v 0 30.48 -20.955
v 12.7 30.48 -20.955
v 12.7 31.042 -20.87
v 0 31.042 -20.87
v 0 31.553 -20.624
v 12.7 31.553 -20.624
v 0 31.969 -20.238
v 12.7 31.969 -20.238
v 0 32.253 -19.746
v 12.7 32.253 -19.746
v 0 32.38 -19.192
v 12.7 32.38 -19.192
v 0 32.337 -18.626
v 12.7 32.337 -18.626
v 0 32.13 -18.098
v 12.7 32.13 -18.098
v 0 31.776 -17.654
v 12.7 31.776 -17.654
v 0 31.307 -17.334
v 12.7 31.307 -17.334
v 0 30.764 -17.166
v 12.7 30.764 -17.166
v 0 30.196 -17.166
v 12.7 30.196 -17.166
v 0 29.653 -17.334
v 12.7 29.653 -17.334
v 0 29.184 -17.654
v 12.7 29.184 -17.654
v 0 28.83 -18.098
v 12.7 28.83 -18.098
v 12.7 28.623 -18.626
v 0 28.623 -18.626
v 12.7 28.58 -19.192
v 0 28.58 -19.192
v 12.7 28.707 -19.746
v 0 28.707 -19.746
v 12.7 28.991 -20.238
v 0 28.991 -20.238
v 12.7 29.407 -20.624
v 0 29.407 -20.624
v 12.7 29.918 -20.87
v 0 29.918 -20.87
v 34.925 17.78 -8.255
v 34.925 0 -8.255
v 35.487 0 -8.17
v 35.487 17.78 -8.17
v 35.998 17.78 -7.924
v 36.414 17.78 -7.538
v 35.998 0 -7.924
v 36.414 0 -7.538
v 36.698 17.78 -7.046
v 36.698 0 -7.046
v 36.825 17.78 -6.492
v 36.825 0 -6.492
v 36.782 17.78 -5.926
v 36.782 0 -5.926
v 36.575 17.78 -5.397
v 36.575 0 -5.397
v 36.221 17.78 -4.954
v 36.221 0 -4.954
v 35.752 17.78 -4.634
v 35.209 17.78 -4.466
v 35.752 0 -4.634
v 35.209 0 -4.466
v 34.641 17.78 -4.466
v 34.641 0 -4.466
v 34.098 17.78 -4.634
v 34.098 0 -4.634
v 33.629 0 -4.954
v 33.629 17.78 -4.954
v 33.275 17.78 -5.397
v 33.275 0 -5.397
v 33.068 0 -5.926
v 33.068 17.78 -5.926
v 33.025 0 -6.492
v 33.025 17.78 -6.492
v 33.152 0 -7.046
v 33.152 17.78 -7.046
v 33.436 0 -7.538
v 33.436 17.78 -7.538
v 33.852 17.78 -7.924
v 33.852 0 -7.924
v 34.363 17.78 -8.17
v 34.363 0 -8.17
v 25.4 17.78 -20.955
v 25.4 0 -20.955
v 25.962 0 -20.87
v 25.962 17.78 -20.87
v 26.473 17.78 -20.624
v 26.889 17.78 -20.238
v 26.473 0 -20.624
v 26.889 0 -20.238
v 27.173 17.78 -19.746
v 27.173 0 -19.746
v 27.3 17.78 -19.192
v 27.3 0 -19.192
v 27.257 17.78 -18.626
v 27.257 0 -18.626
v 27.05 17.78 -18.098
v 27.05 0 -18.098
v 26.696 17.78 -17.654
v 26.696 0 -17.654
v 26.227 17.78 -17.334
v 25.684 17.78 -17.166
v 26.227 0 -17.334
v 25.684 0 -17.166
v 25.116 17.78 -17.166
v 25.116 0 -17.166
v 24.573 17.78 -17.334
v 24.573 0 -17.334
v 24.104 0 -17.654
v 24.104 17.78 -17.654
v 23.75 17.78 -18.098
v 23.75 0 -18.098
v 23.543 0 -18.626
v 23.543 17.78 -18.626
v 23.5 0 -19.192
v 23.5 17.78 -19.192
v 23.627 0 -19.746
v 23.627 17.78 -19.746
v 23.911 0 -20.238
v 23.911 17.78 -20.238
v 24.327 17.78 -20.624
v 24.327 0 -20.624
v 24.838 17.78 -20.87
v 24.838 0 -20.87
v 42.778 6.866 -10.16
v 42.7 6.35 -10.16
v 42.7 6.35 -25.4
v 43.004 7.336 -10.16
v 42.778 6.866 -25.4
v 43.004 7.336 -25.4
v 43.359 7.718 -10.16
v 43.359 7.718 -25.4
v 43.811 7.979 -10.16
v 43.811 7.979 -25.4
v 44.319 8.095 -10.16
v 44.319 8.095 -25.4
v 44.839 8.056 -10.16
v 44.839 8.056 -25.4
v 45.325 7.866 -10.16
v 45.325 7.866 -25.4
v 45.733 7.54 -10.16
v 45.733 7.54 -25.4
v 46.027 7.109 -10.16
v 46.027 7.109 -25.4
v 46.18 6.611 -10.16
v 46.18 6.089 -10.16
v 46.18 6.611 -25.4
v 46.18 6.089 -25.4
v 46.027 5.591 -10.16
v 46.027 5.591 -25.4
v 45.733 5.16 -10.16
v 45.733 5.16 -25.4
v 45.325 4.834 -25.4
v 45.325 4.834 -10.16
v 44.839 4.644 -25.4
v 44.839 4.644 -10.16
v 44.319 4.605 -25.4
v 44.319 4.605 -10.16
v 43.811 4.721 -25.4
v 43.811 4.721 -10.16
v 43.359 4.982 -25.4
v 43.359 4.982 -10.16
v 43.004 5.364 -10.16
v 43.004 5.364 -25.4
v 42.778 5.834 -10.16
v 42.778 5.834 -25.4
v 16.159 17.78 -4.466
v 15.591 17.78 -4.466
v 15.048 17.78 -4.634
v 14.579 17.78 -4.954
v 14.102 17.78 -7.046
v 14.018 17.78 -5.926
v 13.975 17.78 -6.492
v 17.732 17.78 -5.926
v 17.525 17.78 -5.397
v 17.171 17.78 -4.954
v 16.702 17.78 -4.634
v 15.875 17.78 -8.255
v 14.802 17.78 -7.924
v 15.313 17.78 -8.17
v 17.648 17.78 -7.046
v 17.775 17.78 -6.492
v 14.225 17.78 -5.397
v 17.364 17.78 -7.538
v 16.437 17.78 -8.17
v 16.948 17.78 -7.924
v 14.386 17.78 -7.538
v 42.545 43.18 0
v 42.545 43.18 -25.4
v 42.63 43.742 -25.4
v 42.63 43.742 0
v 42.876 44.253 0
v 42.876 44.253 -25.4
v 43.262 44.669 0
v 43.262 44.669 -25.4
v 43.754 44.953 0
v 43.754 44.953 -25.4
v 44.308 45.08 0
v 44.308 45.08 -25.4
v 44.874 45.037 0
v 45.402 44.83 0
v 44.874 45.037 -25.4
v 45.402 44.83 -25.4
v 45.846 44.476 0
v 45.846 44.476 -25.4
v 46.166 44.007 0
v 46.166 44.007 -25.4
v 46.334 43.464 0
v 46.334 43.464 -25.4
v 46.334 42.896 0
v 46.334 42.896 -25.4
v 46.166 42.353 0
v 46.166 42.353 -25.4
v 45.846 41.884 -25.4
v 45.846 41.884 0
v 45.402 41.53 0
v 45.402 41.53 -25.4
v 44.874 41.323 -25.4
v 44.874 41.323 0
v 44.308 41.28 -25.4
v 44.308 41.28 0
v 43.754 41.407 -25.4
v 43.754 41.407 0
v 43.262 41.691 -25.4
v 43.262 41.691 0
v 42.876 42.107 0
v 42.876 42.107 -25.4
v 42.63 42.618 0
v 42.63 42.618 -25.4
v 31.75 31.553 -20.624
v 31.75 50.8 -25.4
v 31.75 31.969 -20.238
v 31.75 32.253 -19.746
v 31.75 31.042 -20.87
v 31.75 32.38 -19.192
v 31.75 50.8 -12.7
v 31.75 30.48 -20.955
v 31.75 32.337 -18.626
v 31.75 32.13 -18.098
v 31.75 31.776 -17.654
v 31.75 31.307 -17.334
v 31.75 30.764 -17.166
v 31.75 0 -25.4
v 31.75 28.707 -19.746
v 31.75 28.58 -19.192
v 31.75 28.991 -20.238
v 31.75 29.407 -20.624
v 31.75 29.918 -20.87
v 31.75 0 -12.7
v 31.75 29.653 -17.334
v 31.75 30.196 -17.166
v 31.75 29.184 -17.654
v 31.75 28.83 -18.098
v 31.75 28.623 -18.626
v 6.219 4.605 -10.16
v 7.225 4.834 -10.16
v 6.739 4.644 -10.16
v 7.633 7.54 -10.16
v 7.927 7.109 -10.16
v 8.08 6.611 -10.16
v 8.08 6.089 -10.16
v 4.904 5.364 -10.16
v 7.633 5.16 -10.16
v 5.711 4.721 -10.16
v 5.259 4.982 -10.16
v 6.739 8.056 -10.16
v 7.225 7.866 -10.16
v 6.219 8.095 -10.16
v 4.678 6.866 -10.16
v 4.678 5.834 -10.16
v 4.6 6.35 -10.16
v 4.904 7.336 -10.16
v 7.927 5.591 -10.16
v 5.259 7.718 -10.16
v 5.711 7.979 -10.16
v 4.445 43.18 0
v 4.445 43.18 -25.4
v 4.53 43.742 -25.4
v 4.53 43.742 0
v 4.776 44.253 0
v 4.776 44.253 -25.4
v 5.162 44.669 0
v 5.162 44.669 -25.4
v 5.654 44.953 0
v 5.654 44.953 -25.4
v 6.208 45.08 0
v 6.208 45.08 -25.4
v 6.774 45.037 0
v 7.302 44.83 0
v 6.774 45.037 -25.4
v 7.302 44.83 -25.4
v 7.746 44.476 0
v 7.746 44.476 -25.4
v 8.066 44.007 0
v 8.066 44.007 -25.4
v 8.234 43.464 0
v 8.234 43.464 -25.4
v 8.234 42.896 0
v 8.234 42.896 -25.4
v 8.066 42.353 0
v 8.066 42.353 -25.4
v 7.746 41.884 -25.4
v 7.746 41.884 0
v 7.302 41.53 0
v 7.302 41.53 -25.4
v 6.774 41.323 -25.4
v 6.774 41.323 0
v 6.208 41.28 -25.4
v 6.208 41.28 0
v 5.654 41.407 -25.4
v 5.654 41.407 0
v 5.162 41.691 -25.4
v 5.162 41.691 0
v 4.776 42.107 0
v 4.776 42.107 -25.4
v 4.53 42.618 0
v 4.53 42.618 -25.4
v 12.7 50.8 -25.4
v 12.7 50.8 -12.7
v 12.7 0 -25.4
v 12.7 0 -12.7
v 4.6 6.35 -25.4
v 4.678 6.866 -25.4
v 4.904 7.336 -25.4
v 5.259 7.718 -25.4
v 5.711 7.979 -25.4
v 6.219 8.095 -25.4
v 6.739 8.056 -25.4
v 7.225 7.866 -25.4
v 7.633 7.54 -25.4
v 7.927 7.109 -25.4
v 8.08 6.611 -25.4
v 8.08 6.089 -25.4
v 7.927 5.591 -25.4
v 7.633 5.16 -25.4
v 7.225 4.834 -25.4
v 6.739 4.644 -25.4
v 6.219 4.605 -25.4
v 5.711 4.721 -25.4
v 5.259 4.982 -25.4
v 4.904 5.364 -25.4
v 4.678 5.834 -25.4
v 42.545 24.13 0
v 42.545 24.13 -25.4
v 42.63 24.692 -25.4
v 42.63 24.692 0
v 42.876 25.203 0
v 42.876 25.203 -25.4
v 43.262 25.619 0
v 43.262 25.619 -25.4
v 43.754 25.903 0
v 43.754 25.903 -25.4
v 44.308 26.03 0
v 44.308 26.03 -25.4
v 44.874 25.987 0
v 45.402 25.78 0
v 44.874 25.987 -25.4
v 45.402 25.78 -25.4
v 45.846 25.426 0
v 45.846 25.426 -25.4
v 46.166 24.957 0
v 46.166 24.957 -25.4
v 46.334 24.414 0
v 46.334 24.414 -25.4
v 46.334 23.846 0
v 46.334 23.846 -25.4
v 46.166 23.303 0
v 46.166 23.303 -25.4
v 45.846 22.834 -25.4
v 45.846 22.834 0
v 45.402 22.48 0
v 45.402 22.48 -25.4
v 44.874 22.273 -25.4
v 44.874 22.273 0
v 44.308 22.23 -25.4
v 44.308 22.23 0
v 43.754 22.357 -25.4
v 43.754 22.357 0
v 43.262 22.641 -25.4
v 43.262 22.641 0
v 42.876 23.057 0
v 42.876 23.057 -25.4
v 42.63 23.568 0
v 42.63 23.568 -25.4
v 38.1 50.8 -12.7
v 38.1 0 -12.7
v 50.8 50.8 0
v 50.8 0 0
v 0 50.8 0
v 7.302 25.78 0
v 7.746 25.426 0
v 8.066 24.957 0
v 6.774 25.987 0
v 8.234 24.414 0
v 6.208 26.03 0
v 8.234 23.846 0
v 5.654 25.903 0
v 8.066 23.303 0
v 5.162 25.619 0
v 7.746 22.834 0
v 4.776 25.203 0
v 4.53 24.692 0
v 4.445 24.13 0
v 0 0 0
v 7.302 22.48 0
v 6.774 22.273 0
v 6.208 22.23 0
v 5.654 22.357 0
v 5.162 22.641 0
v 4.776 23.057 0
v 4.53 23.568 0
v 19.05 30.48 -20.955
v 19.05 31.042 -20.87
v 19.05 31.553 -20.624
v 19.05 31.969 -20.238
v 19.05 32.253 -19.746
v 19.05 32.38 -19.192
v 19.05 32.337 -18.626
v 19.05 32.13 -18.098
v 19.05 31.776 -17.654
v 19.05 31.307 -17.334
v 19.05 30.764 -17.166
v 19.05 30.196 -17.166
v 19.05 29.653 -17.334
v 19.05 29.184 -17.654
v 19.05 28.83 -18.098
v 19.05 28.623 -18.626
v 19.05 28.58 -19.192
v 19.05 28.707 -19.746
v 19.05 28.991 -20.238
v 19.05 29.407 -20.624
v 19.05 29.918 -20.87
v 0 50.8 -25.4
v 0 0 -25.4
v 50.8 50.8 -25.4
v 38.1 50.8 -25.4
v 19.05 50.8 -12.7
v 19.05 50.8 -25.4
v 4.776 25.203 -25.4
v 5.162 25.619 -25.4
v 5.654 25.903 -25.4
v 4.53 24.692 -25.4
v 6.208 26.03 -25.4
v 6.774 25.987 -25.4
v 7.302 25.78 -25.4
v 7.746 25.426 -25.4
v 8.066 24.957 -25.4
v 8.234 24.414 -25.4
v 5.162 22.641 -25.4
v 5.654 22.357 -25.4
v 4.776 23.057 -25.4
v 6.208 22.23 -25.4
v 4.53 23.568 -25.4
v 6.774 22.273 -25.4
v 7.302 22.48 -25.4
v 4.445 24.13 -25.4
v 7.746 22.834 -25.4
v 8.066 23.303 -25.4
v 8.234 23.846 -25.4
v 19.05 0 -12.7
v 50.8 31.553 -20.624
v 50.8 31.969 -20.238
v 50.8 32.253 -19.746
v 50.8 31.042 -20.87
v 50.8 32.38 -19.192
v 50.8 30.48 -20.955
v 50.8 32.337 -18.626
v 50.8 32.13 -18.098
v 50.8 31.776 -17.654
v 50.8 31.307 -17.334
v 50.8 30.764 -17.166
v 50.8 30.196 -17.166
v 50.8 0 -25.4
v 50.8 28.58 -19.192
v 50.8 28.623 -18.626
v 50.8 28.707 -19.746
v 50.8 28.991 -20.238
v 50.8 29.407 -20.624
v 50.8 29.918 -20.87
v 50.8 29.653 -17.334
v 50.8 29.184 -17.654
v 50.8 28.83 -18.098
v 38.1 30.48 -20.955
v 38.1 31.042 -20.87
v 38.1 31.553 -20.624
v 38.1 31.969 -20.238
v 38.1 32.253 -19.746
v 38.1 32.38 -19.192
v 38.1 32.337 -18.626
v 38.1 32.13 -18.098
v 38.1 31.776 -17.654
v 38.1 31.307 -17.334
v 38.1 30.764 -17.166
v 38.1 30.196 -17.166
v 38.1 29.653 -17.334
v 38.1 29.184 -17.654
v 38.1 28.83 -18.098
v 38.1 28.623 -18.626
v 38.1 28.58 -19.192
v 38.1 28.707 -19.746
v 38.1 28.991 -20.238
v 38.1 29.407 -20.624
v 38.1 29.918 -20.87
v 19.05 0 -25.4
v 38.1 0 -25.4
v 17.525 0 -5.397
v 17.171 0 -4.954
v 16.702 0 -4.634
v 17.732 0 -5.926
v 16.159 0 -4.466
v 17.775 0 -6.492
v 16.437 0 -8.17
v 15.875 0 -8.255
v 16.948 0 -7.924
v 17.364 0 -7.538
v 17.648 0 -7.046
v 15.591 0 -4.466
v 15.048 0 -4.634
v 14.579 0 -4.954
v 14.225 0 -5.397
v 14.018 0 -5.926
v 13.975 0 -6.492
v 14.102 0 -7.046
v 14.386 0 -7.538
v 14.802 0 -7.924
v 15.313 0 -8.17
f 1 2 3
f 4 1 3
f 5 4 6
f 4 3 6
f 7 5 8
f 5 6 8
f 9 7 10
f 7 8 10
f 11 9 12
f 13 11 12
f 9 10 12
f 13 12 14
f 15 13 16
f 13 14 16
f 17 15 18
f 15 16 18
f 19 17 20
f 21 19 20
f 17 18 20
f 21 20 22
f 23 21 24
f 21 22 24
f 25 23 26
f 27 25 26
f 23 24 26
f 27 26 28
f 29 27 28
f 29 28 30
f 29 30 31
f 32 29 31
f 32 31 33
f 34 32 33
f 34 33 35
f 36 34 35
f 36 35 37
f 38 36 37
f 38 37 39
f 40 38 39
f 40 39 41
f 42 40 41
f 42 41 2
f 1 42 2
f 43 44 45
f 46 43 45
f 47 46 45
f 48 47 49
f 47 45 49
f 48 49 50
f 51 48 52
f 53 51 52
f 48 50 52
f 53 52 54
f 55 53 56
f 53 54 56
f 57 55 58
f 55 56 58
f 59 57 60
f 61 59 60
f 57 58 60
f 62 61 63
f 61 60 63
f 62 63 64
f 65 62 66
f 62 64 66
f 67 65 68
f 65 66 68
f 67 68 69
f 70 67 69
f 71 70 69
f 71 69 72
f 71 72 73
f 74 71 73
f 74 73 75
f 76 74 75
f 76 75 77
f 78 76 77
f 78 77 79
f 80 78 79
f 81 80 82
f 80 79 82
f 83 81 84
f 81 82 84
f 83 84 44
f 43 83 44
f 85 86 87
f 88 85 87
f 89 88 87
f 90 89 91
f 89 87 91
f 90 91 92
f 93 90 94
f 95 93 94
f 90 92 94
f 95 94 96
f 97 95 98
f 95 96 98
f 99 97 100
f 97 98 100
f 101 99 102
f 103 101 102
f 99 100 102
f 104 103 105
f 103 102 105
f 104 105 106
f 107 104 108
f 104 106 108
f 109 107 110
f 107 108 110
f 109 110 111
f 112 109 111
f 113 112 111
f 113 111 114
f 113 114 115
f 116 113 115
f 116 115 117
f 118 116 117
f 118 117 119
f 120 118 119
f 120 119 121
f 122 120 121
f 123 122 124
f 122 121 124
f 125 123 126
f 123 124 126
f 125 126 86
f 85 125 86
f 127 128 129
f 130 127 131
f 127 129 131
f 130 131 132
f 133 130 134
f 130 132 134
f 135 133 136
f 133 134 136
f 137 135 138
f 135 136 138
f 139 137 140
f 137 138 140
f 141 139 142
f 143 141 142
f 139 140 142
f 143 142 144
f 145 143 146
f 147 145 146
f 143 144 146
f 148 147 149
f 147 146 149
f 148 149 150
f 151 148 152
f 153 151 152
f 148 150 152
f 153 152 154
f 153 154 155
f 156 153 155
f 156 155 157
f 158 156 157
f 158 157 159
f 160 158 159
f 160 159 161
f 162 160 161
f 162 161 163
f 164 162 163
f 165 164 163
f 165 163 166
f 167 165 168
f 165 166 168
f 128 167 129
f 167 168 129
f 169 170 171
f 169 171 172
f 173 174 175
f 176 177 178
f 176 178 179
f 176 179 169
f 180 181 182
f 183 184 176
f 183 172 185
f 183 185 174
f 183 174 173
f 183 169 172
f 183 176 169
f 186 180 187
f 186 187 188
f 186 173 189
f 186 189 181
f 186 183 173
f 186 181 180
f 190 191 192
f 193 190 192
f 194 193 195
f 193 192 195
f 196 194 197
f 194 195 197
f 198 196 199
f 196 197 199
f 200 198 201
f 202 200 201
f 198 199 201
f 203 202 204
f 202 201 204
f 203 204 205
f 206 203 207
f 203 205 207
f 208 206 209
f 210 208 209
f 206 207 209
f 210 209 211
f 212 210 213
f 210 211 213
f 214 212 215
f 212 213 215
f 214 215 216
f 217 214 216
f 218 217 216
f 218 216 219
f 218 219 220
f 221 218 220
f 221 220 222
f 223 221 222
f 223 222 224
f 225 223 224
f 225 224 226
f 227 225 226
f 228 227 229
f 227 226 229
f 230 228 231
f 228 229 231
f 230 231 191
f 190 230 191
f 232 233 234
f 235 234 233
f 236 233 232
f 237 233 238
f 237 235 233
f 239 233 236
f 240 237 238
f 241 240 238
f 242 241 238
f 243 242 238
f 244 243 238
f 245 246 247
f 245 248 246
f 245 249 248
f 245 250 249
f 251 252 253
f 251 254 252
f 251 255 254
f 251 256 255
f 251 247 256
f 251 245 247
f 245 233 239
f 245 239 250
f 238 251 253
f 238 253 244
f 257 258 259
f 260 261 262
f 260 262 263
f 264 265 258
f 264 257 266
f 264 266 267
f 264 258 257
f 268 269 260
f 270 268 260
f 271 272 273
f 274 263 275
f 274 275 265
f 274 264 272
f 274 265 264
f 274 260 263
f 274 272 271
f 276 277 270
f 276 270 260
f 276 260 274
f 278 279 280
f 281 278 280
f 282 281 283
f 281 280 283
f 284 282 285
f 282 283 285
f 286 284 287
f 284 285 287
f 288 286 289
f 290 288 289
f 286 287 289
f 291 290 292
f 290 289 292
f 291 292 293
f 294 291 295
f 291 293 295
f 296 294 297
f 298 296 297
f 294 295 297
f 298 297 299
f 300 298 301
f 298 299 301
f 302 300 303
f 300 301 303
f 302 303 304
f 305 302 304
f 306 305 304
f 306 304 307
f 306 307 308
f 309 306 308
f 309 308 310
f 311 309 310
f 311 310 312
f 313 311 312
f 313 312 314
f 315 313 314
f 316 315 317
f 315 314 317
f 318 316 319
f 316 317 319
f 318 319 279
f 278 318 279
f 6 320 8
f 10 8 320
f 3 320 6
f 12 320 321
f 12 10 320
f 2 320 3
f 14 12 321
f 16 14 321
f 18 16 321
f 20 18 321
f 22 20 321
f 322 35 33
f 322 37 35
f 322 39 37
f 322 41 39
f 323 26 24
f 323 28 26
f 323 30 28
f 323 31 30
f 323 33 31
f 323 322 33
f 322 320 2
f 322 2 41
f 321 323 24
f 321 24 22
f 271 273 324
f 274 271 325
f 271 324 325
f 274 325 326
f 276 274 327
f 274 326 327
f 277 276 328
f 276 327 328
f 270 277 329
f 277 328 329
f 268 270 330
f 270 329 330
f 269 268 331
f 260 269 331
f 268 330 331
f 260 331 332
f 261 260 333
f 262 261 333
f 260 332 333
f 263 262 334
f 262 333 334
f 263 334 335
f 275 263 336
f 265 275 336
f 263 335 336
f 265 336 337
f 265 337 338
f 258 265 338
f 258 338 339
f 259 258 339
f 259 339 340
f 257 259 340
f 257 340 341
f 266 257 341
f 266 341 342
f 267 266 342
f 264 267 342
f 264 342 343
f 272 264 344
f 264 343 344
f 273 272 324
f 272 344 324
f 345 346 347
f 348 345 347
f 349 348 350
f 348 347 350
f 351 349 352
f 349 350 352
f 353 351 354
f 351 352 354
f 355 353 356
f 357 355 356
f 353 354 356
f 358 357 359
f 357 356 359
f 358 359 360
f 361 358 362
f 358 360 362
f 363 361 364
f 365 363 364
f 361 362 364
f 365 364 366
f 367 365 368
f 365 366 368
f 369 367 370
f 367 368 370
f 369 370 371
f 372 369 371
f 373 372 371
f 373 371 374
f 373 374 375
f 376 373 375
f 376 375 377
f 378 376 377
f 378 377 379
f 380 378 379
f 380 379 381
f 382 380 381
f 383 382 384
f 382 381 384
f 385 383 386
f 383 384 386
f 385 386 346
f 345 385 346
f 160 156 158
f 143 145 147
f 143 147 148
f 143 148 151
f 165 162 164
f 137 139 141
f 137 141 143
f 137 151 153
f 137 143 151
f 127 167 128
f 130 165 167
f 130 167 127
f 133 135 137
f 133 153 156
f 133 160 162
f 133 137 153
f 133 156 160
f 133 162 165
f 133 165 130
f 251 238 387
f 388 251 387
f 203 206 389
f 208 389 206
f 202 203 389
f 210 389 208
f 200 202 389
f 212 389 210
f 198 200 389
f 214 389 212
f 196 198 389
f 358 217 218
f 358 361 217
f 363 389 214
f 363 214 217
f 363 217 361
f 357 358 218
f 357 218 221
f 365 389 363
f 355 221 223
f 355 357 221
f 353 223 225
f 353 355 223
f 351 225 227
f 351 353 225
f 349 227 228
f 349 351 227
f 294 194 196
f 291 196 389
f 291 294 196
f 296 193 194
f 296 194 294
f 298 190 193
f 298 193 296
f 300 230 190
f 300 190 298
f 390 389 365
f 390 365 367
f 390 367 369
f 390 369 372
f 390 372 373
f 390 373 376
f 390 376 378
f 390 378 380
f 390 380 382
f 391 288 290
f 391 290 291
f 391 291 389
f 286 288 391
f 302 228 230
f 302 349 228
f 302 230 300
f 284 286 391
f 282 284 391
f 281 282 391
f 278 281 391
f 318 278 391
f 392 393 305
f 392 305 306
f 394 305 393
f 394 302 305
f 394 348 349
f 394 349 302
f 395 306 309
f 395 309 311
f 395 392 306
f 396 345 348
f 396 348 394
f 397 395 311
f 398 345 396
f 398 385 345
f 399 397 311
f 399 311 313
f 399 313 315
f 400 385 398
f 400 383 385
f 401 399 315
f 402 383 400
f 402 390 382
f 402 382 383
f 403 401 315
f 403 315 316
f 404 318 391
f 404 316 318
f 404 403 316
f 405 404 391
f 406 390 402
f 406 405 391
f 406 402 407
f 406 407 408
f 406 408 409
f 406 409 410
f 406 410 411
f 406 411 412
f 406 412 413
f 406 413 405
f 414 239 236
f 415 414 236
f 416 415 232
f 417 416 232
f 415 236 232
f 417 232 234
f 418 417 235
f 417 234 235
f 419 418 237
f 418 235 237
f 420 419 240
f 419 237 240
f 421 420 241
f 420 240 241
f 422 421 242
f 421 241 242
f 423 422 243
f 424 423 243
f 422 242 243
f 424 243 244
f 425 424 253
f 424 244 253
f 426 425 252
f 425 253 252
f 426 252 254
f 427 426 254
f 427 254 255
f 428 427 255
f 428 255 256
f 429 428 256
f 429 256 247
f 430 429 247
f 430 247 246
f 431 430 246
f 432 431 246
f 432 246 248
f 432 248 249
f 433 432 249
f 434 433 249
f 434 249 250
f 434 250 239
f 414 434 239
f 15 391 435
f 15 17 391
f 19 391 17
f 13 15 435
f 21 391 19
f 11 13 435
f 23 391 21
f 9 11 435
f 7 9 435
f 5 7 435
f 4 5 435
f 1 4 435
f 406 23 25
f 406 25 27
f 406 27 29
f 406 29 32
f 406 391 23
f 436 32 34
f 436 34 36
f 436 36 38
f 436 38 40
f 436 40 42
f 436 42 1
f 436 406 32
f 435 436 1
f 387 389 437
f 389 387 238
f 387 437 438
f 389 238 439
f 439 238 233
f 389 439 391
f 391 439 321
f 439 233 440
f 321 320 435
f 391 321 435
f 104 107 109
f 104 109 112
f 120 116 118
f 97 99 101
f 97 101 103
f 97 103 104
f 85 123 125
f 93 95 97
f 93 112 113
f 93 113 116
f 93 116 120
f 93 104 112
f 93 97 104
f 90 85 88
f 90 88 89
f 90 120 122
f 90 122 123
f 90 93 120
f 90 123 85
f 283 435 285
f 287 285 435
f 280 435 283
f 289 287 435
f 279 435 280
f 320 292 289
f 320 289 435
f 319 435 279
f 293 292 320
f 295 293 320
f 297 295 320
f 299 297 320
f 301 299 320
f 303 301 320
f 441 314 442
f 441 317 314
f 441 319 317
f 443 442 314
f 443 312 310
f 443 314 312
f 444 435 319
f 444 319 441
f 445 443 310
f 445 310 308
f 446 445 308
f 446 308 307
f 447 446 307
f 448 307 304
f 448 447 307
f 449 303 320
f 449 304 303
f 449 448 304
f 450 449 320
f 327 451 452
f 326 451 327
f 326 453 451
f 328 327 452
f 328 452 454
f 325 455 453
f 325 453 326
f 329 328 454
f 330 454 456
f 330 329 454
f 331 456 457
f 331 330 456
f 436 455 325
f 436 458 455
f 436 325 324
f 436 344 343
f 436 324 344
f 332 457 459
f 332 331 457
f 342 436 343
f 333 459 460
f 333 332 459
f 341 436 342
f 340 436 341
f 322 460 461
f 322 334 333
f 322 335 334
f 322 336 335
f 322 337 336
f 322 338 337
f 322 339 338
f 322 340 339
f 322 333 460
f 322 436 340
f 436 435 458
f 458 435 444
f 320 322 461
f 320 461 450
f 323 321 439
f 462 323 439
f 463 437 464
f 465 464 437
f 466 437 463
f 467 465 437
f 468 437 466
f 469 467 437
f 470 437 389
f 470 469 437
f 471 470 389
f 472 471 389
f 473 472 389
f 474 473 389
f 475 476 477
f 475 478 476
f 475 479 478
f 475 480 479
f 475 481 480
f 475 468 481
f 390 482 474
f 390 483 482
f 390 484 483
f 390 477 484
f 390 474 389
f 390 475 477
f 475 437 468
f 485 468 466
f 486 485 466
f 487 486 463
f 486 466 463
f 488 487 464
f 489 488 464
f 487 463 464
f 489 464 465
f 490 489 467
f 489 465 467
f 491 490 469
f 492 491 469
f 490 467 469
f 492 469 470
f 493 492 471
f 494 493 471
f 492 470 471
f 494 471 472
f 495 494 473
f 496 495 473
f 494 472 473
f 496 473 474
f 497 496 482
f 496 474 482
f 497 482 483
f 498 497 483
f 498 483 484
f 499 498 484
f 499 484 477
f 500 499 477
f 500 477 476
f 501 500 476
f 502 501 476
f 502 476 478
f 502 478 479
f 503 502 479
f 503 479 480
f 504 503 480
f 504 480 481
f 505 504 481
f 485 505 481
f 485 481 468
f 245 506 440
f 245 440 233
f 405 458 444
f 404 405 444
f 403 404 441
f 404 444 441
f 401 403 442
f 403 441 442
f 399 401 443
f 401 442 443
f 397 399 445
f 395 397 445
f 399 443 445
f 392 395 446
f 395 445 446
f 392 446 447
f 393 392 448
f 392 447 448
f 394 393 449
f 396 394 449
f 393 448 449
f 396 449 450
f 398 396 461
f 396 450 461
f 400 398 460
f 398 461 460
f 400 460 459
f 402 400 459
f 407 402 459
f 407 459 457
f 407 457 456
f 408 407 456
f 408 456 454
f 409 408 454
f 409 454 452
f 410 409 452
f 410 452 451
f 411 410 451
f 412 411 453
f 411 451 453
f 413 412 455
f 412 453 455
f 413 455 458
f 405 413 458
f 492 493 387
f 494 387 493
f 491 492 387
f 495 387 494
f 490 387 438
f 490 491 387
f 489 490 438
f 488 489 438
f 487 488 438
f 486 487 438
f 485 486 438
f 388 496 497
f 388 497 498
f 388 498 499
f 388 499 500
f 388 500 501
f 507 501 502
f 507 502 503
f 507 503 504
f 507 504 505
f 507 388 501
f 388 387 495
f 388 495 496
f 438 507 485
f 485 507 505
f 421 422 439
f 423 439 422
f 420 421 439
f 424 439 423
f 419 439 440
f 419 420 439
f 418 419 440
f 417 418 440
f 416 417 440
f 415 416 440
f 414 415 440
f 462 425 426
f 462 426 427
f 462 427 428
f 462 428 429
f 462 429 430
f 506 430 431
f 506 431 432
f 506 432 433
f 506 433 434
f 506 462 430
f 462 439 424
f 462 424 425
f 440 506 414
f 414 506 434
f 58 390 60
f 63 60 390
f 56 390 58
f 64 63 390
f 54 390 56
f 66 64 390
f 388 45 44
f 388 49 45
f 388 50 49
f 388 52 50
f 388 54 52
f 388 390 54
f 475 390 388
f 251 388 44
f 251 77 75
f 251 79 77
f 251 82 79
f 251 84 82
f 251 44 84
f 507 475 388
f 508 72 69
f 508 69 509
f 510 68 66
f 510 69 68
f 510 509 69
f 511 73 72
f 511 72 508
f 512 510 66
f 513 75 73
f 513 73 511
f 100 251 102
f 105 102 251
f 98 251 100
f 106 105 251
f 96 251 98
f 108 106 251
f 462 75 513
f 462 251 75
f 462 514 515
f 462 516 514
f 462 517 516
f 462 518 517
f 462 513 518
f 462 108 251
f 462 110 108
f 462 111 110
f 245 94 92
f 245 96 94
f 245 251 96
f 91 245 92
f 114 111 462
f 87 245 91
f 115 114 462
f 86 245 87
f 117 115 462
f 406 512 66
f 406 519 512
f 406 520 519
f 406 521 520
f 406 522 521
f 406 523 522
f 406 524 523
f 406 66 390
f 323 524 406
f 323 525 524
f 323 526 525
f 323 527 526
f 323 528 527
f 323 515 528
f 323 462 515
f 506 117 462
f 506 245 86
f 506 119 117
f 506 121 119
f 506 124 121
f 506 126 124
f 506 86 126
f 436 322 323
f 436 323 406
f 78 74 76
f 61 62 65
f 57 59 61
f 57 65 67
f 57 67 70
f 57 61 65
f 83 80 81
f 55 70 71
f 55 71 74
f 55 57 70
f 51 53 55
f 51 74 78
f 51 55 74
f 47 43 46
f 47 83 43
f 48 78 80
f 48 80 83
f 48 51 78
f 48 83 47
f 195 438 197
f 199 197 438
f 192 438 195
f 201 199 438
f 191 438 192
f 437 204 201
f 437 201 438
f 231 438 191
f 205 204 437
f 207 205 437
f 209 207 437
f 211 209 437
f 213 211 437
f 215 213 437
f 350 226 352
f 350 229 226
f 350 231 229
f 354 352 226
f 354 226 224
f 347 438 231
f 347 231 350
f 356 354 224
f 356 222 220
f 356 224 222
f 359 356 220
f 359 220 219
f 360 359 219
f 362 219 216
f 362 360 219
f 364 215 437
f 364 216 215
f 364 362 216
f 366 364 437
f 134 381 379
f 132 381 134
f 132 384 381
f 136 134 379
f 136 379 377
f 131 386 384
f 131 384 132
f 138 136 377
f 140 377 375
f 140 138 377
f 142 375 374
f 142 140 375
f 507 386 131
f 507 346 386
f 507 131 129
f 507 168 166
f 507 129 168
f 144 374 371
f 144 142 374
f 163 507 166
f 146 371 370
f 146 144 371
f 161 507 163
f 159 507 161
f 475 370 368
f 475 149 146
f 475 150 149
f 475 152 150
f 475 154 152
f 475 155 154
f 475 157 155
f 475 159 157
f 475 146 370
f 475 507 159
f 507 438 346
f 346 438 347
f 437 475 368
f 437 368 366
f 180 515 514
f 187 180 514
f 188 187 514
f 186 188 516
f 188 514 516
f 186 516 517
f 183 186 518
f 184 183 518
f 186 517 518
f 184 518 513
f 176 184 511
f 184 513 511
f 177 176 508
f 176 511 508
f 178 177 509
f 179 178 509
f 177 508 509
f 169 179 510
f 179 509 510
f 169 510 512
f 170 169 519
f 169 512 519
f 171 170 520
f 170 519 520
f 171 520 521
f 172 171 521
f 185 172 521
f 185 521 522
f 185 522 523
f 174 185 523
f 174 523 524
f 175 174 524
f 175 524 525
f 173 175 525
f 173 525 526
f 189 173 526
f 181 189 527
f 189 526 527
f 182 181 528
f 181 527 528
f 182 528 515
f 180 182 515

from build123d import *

# Parameters (mm, degrees)
BOSS_EXTRUDE1_DEPTH = 50.8
SKETCH2_R           = 1.75
CUT_EXTRUDE1_DEPTH  = 15.24
CUT_EXTRUDE2_REACH  = 78.2
SKETCH4_R           = 1.905
SKETCH5_R           = 1.905
CUT_EXTRUDE3_DEPTH  = 25.4
SKETCH6_R           = 1.905
CUT_EXTRUDE4_DEPTH  = 17.78


with BuildPart() as part:
    # Sketch1 → Boss-Extrude1 (new body)
    with BuildSketch(Plane(origin=(0, 0, 0), x_dir=(1, 0, 0), z_dir=(0, 1, 0))):
        Polygon((0, 0), (0, 25.4), (12.7, 25.4), (12.7, 12.7), (19.05, 12.7), (19.05, 25.4), (31.75, 25.4), (31.75, 12.7), (38.1, 12.7), (38.1, 25.4), (50.8, 25.4), (50.8, 0), align=None)
    extrude(amount=BOSS_EXTRUDE1_DEPTH)

    # Sketch2 → Cut-Extrude1 (cut)
    with BuildSketch(Plane(origin=(0, 0, -25.4), x_dir=(-1, 0, 0), z_dir=(0, 0, -1))):
        with Locations((-44.45, 6.35)):
            Circle(SKETCH2_R)
        with Locations((-6.35, 6.35)):
            Circle(SKETCH2_R)
    extrude(amount=-CUT_EXTRUDE1_DEPTH, mode=Mode.SUBTRACT)

    # Cut-Extrude2: up to this face of the body (flat: up to its plane)
    cut_extrude2_end = Plane(part.part.faces().sort_by_distance((0, 25.4, -12.7))[0])
    # Sketch4 → Cut-Extrude2 (cut, up to the picked face)
    with BuildSketch(Plane(origin=(50.8, 0, 0), x_dir=(0, 0, -1), z_dir=(1, 0, 0)), mode=Mode.PRIVATE) as cut_extrude2_sk1:
        with Locations((19.05, 30.48)):
            Circle(SKETCH4_R)
    cut_extrude2_tool1 = split(extrude(cut_extrude2_sk1.sketch, amount=-CUT_EXTRUDE2_REACH, mode=Mode.PRIVATE), bisect_by=cut_extrude2_end, keep=Keep.BOTH, mode=Mode.PRIVATE)
    add(cut_extrude2_tool1.solids().sort_by(Axis((50.8, 30.48, -19.05), (-1, 0, 0)))[0], mode=Mode.SUBTRACT)

    # Sketch5 → Cut-Extrude3 (cut)
    with BuildSketch(Plane(origin=(0, 0, -25.4), x_dir=(-1, 0, 0), z_dir=(0, 0, -1))):
        with Locations((-44.45, 24.13)):
            Circle(SKETCH5_R)
        with Locations((-44.45, 43.18)):
            Circle(SKETCH5_R)
        with Locations((-6.35, 24.13)):
            Circle(SKETCH5_R)
        with Locations((-6.35, 43.18)):
            Circle(SKETCH5_R)
    extrude(amount=-CUT_EXTRUDE3_DEPTH, mode=Mode.SUBTRACT)

    # Sketch6 → Cut-Extrude4 (cut)
    with BuildSketch(Plane.XZ):
        with Locations(Location((34.925, -6.35, 0), (0, 0, 270))):
            Circle(SKETCH6_R)
        with Locations(Location((15.875, -6.35, 0), (0, 0, 270))):
            Circle(SKETCH6_R)
        with Locations(Location((25.4, -19.05, 0), (0, 0, 270))):
            Circle(SKETCH6_R)
    extrude(amount=-CUT_EXTRUDE4_DEPTH, mode=Mode.SUBTRACT)


solid = part.part
